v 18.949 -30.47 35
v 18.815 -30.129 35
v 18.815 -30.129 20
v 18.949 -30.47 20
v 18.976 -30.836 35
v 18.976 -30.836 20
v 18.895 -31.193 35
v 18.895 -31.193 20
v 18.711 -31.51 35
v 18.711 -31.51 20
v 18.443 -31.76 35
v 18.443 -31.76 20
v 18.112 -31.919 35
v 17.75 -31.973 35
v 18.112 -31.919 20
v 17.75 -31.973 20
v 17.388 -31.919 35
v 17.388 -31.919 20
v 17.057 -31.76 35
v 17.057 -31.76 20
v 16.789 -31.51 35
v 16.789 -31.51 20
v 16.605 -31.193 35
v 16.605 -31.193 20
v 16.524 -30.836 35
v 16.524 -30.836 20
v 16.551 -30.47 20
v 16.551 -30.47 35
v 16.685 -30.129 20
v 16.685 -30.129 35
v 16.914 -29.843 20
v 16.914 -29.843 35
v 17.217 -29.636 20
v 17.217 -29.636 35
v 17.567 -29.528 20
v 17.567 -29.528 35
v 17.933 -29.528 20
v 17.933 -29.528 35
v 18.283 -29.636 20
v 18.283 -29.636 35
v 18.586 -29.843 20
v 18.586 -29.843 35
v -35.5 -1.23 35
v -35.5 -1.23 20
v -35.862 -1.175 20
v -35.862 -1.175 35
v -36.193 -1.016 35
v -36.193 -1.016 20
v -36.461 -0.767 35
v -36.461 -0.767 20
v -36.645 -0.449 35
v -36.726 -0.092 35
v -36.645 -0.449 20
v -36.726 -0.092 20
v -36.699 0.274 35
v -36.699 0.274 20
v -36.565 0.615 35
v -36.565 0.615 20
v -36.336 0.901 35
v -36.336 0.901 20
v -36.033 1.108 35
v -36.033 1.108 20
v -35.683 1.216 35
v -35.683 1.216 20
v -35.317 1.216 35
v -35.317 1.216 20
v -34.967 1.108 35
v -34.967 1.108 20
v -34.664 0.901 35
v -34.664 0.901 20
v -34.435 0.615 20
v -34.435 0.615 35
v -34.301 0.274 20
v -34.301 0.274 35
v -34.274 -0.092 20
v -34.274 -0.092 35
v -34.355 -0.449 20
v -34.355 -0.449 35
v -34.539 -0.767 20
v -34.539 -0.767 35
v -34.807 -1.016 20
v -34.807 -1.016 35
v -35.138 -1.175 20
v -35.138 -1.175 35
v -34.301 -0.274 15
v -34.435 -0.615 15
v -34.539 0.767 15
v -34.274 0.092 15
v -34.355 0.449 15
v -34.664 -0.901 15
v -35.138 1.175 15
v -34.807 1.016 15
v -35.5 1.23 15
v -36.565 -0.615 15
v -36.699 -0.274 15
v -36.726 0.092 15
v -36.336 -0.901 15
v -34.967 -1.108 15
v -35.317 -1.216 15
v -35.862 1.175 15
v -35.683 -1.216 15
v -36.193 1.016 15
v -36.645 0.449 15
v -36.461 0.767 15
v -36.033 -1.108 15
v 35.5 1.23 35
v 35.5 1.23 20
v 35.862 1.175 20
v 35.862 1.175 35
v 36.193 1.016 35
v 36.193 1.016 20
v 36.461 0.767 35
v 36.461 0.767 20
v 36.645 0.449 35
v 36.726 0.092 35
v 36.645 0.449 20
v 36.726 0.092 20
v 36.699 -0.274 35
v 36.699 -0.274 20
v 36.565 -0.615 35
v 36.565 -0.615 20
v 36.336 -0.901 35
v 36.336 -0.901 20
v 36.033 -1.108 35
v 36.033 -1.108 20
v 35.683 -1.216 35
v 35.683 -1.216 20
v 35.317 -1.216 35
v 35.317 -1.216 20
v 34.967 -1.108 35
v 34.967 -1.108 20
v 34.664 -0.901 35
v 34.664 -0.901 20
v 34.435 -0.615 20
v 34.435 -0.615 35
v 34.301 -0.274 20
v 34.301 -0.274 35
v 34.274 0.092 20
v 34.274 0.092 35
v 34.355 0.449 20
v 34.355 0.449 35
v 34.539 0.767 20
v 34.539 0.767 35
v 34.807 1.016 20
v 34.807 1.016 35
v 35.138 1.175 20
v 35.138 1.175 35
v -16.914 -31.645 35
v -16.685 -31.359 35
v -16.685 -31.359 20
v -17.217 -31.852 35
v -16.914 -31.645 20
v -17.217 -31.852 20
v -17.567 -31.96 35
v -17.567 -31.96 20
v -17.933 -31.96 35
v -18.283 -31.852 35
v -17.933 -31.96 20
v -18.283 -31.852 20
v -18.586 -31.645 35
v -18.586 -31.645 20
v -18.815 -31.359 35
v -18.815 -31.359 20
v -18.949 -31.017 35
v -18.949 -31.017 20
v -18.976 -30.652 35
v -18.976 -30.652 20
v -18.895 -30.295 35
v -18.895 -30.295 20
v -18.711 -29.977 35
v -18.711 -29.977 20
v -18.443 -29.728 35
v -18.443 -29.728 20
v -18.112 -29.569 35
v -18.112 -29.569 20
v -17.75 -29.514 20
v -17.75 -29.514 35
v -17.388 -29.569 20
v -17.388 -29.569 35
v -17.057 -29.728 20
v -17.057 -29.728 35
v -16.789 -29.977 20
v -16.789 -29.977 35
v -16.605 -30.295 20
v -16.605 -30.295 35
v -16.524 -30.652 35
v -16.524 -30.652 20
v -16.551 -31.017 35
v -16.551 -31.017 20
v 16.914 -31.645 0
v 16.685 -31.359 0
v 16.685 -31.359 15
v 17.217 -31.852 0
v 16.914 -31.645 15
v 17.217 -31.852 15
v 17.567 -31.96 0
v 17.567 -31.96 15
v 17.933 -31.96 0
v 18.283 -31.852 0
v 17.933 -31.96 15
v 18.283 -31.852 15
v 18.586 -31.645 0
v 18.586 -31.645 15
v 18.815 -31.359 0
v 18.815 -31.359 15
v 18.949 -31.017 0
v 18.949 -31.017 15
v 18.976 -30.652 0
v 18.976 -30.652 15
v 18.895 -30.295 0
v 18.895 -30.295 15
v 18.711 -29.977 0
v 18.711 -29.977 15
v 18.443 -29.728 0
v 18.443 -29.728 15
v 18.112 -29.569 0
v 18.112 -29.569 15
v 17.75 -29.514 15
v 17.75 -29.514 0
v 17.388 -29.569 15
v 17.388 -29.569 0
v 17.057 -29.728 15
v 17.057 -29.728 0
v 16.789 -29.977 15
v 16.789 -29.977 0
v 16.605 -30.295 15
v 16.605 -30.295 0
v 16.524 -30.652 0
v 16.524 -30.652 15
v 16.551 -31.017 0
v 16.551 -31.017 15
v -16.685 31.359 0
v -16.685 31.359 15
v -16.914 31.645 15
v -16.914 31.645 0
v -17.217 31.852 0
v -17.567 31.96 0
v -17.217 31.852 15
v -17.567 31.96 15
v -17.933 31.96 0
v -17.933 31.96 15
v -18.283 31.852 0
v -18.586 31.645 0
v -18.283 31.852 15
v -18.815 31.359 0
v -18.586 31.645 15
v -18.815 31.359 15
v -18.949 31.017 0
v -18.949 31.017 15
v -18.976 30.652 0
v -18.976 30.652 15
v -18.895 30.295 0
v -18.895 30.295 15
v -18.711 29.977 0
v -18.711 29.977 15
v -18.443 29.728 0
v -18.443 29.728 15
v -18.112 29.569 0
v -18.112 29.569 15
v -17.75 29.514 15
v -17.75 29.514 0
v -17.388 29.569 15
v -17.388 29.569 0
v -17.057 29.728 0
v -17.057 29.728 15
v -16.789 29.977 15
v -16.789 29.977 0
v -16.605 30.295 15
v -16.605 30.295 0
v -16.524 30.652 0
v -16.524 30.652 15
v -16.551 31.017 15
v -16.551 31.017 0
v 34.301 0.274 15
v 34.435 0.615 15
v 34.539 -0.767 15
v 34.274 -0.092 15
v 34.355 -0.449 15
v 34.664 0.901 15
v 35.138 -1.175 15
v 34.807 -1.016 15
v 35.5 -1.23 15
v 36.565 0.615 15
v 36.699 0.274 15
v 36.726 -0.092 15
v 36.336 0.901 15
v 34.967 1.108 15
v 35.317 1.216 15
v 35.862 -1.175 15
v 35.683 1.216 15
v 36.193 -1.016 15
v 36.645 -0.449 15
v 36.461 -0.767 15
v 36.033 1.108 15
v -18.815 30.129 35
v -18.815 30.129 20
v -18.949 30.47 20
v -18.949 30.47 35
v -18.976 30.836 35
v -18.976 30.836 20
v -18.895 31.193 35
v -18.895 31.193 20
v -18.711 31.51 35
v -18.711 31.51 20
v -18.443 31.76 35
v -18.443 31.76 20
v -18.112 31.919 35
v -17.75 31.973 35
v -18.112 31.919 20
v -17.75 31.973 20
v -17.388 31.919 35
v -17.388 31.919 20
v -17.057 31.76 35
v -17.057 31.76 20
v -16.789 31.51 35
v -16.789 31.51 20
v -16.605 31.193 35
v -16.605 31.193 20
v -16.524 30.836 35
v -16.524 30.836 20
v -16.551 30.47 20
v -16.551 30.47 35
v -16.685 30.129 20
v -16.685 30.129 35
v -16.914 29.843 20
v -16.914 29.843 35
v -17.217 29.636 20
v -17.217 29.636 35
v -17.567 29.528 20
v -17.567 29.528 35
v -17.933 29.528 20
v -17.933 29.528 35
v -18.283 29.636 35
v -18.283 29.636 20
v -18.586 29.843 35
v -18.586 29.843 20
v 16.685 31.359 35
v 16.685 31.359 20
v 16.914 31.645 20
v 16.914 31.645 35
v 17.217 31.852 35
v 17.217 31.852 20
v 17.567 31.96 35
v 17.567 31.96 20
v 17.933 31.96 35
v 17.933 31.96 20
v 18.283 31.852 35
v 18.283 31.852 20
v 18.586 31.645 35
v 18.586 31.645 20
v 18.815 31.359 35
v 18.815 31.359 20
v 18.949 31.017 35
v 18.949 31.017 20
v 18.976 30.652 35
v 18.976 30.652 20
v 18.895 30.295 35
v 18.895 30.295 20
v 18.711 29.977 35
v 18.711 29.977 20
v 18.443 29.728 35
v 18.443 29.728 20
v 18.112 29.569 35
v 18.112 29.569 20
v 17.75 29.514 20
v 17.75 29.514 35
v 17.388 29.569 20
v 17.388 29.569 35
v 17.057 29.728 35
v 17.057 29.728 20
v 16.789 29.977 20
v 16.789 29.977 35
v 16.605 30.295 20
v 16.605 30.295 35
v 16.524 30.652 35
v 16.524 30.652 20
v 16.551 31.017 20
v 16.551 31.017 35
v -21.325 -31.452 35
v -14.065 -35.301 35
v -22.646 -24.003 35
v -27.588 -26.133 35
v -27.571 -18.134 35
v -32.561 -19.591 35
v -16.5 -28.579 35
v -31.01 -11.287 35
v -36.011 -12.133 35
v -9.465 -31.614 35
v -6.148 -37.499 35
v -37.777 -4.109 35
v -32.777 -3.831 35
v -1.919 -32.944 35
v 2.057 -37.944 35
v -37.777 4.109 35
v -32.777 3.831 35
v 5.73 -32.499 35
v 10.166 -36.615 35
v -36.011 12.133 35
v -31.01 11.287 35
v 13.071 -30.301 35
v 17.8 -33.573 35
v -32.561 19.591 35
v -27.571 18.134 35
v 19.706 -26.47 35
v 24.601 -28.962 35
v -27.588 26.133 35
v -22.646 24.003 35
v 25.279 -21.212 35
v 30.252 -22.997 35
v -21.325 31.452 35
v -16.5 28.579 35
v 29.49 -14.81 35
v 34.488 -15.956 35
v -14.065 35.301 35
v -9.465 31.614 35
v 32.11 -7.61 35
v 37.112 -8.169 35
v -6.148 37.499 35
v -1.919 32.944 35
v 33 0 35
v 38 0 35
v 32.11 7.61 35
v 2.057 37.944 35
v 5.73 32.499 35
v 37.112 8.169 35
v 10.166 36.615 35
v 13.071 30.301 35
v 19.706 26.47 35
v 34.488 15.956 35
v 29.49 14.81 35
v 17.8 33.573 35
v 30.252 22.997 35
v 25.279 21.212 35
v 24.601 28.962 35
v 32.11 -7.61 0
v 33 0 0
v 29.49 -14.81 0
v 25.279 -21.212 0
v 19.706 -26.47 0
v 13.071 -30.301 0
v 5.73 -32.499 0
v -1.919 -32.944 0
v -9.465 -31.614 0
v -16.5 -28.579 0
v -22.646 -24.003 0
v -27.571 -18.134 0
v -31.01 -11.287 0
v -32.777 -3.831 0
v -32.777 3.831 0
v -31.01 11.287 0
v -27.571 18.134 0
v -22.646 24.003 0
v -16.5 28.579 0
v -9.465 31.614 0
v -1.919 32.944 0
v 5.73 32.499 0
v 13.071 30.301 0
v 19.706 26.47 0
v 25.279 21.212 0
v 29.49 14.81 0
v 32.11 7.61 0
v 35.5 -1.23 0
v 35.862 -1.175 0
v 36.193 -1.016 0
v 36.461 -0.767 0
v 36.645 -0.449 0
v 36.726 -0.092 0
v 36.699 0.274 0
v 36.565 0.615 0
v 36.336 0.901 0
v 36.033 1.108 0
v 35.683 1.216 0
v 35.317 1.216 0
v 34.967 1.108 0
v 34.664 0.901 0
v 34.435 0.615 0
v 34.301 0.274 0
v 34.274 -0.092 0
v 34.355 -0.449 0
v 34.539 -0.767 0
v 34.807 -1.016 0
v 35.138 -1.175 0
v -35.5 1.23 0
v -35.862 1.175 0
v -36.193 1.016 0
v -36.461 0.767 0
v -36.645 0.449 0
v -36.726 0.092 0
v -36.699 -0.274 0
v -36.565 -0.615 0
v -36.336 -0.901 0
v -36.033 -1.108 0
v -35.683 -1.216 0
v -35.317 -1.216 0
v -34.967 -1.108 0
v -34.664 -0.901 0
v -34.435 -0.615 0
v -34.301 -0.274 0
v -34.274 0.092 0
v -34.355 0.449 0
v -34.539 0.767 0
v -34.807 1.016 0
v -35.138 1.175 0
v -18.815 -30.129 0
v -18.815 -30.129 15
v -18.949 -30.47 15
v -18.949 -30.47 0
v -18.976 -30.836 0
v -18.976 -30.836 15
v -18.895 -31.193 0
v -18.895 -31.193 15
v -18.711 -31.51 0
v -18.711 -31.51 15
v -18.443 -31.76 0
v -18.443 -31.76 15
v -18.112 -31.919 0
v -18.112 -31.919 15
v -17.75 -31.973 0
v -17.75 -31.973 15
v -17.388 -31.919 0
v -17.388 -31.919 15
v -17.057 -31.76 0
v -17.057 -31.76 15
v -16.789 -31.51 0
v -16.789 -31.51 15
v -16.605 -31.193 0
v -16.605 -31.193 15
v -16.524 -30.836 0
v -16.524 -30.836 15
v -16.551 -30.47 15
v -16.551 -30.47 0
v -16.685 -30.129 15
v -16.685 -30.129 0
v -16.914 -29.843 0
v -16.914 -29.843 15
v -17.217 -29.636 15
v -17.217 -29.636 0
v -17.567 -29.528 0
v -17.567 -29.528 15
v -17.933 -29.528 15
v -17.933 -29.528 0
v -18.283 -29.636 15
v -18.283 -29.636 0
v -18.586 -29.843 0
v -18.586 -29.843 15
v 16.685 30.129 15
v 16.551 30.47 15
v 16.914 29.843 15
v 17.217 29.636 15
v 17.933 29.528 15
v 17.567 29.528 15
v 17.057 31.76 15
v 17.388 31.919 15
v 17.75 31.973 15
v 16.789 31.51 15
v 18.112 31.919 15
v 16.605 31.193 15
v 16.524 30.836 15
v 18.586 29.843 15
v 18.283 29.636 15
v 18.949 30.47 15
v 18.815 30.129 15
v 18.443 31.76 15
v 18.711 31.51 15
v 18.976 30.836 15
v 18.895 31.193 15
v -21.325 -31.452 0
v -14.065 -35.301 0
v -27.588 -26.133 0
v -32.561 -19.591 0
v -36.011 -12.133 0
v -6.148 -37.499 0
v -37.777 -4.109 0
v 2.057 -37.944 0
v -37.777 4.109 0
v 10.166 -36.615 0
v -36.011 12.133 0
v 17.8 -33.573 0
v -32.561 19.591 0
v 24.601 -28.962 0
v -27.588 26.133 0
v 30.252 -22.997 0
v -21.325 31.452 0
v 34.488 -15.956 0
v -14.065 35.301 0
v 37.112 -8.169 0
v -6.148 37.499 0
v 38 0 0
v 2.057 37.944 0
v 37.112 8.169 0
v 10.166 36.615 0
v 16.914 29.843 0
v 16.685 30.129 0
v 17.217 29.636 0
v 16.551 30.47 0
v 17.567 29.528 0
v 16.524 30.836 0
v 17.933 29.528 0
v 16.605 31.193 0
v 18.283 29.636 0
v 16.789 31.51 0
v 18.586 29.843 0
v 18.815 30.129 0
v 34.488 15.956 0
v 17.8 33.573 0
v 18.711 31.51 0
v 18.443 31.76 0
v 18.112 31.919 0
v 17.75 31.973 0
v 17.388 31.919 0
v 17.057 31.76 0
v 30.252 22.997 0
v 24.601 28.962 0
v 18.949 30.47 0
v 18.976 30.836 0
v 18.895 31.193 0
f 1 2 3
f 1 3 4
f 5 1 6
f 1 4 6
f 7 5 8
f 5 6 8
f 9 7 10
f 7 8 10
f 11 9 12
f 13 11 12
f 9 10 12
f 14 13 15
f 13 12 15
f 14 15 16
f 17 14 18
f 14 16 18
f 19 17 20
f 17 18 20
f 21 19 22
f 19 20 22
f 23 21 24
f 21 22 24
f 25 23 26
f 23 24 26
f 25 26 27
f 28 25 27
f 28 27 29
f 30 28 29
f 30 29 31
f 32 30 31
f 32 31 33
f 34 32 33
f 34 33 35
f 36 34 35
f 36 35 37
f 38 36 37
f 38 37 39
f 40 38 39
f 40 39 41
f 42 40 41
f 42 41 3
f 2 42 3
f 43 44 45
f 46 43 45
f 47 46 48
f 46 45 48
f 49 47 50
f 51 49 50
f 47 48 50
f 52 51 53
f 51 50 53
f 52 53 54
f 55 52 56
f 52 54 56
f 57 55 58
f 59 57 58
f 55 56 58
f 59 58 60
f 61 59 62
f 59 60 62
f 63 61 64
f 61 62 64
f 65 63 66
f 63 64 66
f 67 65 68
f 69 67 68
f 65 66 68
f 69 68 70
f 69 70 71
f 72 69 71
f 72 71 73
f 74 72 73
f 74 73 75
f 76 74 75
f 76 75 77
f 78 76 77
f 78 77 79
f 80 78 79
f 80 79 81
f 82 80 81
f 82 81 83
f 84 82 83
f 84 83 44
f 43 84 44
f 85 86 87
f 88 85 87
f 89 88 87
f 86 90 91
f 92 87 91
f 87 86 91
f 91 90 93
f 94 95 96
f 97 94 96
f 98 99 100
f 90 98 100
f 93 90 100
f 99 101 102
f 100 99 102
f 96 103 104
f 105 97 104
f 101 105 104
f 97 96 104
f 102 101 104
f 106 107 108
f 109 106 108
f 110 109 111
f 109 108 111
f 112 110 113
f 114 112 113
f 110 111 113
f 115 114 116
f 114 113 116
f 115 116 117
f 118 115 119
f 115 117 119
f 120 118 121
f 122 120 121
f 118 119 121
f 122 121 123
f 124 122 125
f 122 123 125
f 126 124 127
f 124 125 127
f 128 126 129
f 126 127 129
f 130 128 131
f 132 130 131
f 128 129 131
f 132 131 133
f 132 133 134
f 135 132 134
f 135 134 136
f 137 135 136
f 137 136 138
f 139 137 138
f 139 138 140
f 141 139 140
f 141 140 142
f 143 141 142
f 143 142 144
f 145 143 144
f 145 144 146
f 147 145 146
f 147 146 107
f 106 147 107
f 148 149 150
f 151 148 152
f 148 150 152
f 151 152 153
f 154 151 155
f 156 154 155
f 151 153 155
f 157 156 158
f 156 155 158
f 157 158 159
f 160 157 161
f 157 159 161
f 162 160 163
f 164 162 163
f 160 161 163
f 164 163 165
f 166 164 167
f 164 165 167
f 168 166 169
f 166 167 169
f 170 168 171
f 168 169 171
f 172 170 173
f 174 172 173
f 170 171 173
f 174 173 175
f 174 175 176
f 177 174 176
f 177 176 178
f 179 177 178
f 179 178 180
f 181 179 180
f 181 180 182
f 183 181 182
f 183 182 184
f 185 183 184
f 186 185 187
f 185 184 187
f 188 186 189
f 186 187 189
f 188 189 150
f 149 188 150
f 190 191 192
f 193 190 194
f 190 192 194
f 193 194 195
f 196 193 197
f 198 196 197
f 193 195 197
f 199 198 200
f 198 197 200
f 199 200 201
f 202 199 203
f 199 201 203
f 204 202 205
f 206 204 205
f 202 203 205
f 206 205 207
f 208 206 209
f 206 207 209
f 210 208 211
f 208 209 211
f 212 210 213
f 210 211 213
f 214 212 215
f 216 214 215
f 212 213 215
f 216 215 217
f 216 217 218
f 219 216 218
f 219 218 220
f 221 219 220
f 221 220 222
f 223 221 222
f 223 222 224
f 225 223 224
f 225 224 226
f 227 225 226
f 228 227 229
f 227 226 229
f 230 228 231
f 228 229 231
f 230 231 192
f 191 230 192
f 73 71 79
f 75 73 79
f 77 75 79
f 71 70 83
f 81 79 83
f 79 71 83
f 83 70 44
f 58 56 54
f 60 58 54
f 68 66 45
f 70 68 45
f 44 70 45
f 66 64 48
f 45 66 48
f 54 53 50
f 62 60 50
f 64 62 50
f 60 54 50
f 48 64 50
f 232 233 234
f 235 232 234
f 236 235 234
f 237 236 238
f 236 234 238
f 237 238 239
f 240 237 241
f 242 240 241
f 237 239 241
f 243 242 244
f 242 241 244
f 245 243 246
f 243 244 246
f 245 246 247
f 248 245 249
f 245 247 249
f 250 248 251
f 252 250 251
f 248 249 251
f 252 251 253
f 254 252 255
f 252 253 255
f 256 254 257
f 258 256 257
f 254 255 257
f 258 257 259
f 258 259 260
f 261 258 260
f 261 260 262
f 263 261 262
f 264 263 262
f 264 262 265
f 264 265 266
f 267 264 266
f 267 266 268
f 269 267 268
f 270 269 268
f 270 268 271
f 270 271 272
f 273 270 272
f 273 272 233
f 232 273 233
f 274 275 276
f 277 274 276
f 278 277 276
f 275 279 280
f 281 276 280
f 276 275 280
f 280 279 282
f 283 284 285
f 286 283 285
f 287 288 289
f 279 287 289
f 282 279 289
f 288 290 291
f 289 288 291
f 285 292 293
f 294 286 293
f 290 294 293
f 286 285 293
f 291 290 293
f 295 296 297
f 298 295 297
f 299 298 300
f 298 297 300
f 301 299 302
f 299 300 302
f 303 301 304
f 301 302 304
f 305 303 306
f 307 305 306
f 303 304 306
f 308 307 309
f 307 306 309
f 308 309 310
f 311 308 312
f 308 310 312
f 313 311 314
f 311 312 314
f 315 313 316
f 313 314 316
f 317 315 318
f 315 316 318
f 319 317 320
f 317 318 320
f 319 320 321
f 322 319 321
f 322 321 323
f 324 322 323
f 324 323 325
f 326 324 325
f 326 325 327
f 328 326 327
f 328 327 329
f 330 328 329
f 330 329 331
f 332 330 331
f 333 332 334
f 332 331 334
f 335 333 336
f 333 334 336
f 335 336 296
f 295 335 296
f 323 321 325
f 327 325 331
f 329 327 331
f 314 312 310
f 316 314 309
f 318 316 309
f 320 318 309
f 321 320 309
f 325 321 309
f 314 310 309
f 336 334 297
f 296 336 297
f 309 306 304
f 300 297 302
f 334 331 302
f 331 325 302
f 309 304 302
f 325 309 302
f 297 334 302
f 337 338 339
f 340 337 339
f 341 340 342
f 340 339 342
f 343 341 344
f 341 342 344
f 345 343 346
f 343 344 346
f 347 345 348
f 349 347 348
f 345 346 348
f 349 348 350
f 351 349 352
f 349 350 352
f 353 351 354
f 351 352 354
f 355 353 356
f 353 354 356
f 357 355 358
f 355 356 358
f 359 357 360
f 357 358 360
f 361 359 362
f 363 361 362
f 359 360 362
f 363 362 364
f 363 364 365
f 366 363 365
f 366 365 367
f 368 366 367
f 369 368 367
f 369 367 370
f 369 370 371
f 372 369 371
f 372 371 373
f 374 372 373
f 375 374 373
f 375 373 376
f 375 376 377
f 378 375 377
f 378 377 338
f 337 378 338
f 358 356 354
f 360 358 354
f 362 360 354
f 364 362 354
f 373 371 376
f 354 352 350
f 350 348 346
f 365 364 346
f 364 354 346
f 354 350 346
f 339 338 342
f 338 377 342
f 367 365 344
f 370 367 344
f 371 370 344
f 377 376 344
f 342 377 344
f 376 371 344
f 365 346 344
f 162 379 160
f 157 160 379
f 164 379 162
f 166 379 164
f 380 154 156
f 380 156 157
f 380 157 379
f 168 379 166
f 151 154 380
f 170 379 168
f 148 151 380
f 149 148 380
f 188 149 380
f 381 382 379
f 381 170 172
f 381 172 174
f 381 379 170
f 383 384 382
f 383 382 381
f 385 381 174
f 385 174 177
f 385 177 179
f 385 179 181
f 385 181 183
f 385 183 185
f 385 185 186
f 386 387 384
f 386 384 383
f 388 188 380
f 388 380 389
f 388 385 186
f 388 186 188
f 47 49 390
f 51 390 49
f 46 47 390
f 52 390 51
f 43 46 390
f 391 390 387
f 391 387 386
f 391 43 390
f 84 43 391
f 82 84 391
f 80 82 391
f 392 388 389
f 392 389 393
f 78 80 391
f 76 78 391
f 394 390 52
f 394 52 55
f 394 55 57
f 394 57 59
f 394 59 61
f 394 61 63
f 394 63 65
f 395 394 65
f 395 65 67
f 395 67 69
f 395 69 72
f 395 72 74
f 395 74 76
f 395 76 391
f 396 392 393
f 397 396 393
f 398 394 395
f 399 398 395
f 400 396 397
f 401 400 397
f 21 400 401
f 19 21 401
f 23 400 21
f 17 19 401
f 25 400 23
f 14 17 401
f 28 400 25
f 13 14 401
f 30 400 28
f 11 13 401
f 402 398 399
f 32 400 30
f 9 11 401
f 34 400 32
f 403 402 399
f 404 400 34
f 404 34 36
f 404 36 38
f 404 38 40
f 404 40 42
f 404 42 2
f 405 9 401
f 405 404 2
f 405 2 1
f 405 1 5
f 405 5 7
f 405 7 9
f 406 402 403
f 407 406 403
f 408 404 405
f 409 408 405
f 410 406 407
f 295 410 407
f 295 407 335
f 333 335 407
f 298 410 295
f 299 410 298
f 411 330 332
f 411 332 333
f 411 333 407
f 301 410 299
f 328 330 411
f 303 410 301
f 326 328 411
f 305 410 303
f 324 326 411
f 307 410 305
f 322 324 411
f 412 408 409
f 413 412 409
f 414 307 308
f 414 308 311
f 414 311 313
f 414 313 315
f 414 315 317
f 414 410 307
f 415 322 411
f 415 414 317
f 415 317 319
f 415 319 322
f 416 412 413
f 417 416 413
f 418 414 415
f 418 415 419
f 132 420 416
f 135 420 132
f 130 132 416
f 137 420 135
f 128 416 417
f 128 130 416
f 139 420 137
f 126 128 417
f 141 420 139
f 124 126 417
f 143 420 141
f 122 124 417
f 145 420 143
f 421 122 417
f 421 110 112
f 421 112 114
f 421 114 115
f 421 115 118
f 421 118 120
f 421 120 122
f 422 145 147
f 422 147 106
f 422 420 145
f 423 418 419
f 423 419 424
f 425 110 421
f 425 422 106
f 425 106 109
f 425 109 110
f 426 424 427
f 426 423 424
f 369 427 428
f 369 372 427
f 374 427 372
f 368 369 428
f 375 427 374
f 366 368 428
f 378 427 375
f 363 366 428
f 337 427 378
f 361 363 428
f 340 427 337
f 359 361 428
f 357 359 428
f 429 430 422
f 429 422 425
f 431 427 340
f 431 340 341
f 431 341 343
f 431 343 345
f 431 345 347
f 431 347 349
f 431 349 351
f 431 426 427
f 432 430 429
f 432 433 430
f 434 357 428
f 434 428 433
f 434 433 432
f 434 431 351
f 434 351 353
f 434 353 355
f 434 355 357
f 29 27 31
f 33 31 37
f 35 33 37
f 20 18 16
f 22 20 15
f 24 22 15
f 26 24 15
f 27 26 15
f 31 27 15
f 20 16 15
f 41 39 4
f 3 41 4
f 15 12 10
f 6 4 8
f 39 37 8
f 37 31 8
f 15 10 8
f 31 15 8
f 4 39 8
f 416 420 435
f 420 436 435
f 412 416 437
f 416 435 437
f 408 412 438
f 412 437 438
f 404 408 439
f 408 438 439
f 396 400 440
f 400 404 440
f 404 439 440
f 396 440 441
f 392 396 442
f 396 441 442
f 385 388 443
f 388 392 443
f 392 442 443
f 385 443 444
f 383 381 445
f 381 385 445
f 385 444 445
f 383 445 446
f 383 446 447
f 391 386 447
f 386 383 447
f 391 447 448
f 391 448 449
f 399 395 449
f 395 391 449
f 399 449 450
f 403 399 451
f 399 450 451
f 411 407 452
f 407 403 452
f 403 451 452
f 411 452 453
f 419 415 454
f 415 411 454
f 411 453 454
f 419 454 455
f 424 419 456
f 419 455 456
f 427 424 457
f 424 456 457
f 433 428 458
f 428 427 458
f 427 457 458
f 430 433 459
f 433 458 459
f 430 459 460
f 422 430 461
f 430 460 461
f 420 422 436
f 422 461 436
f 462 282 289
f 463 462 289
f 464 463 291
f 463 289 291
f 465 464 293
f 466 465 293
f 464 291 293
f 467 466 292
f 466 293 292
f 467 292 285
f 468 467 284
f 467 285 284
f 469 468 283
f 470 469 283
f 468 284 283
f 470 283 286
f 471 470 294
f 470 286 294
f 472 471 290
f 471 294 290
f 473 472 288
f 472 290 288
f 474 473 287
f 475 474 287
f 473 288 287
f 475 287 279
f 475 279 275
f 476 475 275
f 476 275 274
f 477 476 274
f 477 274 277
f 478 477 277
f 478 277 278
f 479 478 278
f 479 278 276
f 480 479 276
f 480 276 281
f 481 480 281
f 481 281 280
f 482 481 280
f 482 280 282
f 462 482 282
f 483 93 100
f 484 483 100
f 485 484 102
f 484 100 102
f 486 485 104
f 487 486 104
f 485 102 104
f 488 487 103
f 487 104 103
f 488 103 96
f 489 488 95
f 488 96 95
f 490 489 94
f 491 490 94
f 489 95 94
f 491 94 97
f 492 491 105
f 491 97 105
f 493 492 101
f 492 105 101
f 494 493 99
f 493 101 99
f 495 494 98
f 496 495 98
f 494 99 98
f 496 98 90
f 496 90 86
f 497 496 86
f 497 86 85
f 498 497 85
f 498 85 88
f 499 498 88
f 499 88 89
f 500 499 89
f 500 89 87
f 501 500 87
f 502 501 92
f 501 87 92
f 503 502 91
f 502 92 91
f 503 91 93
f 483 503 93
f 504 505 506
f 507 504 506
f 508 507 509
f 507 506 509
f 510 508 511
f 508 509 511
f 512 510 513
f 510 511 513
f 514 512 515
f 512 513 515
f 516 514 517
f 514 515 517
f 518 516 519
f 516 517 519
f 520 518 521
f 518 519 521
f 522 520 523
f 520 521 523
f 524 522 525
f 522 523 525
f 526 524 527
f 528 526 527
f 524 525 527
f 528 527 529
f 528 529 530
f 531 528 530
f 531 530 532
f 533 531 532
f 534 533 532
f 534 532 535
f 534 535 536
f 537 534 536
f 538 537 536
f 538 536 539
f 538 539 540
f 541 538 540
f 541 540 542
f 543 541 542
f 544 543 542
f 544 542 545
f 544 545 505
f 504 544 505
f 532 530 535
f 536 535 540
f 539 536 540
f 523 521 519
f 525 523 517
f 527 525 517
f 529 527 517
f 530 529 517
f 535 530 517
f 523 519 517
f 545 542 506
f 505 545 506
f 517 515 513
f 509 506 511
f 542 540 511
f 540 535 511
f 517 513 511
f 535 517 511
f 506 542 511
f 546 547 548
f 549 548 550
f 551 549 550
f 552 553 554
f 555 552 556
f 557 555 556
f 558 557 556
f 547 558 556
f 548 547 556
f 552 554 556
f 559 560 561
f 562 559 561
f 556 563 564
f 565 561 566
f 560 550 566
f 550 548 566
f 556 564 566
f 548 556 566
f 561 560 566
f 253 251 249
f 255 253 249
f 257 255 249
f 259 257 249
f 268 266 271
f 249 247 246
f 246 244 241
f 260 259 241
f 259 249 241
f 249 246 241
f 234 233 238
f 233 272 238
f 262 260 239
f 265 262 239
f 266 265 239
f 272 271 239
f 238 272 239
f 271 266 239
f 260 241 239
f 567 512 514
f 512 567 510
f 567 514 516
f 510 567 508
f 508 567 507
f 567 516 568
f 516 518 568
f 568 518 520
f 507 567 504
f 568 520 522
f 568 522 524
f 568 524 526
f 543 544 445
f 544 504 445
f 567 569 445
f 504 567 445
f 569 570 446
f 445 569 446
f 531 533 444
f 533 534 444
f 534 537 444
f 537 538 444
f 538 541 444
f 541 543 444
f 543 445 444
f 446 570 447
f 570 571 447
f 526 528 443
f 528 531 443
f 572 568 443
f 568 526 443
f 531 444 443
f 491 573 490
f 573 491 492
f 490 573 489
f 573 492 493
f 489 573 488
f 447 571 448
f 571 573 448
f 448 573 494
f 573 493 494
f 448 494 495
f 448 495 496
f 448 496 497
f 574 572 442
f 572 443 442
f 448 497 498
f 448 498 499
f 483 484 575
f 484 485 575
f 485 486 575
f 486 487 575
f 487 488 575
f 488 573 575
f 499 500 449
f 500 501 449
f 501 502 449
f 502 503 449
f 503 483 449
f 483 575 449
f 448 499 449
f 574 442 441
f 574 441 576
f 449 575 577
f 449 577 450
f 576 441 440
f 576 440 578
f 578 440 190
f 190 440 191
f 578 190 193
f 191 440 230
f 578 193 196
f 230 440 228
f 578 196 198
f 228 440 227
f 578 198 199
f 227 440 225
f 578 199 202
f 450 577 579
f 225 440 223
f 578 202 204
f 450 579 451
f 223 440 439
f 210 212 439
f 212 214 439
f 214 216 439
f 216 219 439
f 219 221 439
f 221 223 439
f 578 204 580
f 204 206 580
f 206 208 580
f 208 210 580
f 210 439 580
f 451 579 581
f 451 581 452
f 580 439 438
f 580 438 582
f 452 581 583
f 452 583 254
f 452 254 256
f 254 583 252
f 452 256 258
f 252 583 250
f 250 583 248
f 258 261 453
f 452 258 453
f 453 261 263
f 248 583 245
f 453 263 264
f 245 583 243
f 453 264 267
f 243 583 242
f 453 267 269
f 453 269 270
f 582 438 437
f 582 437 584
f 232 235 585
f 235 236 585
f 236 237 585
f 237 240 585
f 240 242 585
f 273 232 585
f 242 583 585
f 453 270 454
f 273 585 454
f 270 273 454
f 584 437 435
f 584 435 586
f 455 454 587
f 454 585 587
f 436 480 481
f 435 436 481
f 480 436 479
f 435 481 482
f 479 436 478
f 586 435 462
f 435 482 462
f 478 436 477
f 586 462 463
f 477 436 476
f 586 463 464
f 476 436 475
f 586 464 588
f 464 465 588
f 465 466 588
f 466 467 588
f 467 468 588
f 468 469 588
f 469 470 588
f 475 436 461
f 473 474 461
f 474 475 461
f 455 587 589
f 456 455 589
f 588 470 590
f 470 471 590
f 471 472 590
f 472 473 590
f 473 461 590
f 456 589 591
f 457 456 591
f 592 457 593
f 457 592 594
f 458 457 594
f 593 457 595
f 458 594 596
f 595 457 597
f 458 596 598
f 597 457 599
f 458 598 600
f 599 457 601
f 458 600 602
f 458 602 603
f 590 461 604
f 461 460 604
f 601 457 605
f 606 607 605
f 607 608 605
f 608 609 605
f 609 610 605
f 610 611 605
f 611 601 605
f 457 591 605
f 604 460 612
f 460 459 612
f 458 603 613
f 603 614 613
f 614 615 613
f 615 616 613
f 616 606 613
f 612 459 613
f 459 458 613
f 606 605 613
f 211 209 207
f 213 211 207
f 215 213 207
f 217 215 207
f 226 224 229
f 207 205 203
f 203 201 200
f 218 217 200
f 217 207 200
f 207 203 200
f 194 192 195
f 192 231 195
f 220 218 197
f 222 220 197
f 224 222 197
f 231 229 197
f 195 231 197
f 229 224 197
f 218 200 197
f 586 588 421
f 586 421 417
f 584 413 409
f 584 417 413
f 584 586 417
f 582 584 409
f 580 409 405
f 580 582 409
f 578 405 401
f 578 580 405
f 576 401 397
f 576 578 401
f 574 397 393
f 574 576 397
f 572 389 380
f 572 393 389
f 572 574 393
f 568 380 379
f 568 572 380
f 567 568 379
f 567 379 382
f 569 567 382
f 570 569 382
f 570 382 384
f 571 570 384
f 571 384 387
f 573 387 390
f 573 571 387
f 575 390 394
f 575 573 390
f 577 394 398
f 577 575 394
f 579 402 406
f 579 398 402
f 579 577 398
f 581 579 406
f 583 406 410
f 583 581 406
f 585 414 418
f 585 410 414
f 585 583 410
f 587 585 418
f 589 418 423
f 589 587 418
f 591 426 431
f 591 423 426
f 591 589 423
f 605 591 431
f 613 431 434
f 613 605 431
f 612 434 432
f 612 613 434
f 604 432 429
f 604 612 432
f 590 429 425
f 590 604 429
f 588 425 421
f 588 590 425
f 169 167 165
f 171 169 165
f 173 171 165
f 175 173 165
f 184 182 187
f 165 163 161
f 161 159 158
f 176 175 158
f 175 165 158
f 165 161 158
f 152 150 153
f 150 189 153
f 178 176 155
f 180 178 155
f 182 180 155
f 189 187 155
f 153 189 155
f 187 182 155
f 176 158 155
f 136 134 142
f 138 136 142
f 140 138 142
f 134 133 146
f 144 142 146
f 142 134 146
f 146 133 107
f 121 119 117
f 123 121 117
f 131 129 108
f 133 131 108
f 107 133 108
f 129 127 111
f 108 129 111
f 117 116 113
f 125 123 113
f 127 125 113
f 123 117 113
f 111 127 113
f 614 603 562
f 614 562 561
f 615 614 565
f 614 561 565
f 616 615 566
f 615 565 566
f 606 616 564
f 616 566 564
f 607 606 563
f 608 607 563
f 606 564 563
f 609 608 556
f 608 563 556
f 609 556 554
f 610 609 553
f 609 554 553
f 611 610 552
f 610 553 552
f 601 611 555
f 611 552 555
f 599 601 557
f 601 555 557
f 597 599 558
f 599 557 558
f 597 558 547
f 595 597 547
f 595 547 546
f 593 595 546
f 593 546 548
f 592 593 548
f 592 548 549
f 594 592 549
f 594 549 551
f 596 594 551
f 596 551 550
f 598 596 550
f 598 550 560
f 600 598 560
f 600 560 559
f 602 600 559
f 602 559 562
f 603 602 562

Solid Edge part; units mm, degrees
sketch "Sketch1" plane through (0, 0, 0) normal (0, 0, 1) x (1, 0, 0)
  circle A0 centre (0, 0) radius 38
  circle A1 centre (0, 0) radius 33
extrude "Protrusion1" add sketch "Sketch1" along normal blind 35
hole "Hole_1" at (-35.5, 0, 0) direction (0, 0, 1) diameter 2.459 depth 15 thread major 3 thread length 2
hole "Hole_2" at (-35.5, 0, 35) direction (0, 0, -1) diameter 2.459 depth 15 thread major 3 thread length 2
pattern_circular "Pattern1" count 6 over 360 about axis through (0, 0, 35) along (0, 0, -1) of "Hole_1", "Hole_2"
